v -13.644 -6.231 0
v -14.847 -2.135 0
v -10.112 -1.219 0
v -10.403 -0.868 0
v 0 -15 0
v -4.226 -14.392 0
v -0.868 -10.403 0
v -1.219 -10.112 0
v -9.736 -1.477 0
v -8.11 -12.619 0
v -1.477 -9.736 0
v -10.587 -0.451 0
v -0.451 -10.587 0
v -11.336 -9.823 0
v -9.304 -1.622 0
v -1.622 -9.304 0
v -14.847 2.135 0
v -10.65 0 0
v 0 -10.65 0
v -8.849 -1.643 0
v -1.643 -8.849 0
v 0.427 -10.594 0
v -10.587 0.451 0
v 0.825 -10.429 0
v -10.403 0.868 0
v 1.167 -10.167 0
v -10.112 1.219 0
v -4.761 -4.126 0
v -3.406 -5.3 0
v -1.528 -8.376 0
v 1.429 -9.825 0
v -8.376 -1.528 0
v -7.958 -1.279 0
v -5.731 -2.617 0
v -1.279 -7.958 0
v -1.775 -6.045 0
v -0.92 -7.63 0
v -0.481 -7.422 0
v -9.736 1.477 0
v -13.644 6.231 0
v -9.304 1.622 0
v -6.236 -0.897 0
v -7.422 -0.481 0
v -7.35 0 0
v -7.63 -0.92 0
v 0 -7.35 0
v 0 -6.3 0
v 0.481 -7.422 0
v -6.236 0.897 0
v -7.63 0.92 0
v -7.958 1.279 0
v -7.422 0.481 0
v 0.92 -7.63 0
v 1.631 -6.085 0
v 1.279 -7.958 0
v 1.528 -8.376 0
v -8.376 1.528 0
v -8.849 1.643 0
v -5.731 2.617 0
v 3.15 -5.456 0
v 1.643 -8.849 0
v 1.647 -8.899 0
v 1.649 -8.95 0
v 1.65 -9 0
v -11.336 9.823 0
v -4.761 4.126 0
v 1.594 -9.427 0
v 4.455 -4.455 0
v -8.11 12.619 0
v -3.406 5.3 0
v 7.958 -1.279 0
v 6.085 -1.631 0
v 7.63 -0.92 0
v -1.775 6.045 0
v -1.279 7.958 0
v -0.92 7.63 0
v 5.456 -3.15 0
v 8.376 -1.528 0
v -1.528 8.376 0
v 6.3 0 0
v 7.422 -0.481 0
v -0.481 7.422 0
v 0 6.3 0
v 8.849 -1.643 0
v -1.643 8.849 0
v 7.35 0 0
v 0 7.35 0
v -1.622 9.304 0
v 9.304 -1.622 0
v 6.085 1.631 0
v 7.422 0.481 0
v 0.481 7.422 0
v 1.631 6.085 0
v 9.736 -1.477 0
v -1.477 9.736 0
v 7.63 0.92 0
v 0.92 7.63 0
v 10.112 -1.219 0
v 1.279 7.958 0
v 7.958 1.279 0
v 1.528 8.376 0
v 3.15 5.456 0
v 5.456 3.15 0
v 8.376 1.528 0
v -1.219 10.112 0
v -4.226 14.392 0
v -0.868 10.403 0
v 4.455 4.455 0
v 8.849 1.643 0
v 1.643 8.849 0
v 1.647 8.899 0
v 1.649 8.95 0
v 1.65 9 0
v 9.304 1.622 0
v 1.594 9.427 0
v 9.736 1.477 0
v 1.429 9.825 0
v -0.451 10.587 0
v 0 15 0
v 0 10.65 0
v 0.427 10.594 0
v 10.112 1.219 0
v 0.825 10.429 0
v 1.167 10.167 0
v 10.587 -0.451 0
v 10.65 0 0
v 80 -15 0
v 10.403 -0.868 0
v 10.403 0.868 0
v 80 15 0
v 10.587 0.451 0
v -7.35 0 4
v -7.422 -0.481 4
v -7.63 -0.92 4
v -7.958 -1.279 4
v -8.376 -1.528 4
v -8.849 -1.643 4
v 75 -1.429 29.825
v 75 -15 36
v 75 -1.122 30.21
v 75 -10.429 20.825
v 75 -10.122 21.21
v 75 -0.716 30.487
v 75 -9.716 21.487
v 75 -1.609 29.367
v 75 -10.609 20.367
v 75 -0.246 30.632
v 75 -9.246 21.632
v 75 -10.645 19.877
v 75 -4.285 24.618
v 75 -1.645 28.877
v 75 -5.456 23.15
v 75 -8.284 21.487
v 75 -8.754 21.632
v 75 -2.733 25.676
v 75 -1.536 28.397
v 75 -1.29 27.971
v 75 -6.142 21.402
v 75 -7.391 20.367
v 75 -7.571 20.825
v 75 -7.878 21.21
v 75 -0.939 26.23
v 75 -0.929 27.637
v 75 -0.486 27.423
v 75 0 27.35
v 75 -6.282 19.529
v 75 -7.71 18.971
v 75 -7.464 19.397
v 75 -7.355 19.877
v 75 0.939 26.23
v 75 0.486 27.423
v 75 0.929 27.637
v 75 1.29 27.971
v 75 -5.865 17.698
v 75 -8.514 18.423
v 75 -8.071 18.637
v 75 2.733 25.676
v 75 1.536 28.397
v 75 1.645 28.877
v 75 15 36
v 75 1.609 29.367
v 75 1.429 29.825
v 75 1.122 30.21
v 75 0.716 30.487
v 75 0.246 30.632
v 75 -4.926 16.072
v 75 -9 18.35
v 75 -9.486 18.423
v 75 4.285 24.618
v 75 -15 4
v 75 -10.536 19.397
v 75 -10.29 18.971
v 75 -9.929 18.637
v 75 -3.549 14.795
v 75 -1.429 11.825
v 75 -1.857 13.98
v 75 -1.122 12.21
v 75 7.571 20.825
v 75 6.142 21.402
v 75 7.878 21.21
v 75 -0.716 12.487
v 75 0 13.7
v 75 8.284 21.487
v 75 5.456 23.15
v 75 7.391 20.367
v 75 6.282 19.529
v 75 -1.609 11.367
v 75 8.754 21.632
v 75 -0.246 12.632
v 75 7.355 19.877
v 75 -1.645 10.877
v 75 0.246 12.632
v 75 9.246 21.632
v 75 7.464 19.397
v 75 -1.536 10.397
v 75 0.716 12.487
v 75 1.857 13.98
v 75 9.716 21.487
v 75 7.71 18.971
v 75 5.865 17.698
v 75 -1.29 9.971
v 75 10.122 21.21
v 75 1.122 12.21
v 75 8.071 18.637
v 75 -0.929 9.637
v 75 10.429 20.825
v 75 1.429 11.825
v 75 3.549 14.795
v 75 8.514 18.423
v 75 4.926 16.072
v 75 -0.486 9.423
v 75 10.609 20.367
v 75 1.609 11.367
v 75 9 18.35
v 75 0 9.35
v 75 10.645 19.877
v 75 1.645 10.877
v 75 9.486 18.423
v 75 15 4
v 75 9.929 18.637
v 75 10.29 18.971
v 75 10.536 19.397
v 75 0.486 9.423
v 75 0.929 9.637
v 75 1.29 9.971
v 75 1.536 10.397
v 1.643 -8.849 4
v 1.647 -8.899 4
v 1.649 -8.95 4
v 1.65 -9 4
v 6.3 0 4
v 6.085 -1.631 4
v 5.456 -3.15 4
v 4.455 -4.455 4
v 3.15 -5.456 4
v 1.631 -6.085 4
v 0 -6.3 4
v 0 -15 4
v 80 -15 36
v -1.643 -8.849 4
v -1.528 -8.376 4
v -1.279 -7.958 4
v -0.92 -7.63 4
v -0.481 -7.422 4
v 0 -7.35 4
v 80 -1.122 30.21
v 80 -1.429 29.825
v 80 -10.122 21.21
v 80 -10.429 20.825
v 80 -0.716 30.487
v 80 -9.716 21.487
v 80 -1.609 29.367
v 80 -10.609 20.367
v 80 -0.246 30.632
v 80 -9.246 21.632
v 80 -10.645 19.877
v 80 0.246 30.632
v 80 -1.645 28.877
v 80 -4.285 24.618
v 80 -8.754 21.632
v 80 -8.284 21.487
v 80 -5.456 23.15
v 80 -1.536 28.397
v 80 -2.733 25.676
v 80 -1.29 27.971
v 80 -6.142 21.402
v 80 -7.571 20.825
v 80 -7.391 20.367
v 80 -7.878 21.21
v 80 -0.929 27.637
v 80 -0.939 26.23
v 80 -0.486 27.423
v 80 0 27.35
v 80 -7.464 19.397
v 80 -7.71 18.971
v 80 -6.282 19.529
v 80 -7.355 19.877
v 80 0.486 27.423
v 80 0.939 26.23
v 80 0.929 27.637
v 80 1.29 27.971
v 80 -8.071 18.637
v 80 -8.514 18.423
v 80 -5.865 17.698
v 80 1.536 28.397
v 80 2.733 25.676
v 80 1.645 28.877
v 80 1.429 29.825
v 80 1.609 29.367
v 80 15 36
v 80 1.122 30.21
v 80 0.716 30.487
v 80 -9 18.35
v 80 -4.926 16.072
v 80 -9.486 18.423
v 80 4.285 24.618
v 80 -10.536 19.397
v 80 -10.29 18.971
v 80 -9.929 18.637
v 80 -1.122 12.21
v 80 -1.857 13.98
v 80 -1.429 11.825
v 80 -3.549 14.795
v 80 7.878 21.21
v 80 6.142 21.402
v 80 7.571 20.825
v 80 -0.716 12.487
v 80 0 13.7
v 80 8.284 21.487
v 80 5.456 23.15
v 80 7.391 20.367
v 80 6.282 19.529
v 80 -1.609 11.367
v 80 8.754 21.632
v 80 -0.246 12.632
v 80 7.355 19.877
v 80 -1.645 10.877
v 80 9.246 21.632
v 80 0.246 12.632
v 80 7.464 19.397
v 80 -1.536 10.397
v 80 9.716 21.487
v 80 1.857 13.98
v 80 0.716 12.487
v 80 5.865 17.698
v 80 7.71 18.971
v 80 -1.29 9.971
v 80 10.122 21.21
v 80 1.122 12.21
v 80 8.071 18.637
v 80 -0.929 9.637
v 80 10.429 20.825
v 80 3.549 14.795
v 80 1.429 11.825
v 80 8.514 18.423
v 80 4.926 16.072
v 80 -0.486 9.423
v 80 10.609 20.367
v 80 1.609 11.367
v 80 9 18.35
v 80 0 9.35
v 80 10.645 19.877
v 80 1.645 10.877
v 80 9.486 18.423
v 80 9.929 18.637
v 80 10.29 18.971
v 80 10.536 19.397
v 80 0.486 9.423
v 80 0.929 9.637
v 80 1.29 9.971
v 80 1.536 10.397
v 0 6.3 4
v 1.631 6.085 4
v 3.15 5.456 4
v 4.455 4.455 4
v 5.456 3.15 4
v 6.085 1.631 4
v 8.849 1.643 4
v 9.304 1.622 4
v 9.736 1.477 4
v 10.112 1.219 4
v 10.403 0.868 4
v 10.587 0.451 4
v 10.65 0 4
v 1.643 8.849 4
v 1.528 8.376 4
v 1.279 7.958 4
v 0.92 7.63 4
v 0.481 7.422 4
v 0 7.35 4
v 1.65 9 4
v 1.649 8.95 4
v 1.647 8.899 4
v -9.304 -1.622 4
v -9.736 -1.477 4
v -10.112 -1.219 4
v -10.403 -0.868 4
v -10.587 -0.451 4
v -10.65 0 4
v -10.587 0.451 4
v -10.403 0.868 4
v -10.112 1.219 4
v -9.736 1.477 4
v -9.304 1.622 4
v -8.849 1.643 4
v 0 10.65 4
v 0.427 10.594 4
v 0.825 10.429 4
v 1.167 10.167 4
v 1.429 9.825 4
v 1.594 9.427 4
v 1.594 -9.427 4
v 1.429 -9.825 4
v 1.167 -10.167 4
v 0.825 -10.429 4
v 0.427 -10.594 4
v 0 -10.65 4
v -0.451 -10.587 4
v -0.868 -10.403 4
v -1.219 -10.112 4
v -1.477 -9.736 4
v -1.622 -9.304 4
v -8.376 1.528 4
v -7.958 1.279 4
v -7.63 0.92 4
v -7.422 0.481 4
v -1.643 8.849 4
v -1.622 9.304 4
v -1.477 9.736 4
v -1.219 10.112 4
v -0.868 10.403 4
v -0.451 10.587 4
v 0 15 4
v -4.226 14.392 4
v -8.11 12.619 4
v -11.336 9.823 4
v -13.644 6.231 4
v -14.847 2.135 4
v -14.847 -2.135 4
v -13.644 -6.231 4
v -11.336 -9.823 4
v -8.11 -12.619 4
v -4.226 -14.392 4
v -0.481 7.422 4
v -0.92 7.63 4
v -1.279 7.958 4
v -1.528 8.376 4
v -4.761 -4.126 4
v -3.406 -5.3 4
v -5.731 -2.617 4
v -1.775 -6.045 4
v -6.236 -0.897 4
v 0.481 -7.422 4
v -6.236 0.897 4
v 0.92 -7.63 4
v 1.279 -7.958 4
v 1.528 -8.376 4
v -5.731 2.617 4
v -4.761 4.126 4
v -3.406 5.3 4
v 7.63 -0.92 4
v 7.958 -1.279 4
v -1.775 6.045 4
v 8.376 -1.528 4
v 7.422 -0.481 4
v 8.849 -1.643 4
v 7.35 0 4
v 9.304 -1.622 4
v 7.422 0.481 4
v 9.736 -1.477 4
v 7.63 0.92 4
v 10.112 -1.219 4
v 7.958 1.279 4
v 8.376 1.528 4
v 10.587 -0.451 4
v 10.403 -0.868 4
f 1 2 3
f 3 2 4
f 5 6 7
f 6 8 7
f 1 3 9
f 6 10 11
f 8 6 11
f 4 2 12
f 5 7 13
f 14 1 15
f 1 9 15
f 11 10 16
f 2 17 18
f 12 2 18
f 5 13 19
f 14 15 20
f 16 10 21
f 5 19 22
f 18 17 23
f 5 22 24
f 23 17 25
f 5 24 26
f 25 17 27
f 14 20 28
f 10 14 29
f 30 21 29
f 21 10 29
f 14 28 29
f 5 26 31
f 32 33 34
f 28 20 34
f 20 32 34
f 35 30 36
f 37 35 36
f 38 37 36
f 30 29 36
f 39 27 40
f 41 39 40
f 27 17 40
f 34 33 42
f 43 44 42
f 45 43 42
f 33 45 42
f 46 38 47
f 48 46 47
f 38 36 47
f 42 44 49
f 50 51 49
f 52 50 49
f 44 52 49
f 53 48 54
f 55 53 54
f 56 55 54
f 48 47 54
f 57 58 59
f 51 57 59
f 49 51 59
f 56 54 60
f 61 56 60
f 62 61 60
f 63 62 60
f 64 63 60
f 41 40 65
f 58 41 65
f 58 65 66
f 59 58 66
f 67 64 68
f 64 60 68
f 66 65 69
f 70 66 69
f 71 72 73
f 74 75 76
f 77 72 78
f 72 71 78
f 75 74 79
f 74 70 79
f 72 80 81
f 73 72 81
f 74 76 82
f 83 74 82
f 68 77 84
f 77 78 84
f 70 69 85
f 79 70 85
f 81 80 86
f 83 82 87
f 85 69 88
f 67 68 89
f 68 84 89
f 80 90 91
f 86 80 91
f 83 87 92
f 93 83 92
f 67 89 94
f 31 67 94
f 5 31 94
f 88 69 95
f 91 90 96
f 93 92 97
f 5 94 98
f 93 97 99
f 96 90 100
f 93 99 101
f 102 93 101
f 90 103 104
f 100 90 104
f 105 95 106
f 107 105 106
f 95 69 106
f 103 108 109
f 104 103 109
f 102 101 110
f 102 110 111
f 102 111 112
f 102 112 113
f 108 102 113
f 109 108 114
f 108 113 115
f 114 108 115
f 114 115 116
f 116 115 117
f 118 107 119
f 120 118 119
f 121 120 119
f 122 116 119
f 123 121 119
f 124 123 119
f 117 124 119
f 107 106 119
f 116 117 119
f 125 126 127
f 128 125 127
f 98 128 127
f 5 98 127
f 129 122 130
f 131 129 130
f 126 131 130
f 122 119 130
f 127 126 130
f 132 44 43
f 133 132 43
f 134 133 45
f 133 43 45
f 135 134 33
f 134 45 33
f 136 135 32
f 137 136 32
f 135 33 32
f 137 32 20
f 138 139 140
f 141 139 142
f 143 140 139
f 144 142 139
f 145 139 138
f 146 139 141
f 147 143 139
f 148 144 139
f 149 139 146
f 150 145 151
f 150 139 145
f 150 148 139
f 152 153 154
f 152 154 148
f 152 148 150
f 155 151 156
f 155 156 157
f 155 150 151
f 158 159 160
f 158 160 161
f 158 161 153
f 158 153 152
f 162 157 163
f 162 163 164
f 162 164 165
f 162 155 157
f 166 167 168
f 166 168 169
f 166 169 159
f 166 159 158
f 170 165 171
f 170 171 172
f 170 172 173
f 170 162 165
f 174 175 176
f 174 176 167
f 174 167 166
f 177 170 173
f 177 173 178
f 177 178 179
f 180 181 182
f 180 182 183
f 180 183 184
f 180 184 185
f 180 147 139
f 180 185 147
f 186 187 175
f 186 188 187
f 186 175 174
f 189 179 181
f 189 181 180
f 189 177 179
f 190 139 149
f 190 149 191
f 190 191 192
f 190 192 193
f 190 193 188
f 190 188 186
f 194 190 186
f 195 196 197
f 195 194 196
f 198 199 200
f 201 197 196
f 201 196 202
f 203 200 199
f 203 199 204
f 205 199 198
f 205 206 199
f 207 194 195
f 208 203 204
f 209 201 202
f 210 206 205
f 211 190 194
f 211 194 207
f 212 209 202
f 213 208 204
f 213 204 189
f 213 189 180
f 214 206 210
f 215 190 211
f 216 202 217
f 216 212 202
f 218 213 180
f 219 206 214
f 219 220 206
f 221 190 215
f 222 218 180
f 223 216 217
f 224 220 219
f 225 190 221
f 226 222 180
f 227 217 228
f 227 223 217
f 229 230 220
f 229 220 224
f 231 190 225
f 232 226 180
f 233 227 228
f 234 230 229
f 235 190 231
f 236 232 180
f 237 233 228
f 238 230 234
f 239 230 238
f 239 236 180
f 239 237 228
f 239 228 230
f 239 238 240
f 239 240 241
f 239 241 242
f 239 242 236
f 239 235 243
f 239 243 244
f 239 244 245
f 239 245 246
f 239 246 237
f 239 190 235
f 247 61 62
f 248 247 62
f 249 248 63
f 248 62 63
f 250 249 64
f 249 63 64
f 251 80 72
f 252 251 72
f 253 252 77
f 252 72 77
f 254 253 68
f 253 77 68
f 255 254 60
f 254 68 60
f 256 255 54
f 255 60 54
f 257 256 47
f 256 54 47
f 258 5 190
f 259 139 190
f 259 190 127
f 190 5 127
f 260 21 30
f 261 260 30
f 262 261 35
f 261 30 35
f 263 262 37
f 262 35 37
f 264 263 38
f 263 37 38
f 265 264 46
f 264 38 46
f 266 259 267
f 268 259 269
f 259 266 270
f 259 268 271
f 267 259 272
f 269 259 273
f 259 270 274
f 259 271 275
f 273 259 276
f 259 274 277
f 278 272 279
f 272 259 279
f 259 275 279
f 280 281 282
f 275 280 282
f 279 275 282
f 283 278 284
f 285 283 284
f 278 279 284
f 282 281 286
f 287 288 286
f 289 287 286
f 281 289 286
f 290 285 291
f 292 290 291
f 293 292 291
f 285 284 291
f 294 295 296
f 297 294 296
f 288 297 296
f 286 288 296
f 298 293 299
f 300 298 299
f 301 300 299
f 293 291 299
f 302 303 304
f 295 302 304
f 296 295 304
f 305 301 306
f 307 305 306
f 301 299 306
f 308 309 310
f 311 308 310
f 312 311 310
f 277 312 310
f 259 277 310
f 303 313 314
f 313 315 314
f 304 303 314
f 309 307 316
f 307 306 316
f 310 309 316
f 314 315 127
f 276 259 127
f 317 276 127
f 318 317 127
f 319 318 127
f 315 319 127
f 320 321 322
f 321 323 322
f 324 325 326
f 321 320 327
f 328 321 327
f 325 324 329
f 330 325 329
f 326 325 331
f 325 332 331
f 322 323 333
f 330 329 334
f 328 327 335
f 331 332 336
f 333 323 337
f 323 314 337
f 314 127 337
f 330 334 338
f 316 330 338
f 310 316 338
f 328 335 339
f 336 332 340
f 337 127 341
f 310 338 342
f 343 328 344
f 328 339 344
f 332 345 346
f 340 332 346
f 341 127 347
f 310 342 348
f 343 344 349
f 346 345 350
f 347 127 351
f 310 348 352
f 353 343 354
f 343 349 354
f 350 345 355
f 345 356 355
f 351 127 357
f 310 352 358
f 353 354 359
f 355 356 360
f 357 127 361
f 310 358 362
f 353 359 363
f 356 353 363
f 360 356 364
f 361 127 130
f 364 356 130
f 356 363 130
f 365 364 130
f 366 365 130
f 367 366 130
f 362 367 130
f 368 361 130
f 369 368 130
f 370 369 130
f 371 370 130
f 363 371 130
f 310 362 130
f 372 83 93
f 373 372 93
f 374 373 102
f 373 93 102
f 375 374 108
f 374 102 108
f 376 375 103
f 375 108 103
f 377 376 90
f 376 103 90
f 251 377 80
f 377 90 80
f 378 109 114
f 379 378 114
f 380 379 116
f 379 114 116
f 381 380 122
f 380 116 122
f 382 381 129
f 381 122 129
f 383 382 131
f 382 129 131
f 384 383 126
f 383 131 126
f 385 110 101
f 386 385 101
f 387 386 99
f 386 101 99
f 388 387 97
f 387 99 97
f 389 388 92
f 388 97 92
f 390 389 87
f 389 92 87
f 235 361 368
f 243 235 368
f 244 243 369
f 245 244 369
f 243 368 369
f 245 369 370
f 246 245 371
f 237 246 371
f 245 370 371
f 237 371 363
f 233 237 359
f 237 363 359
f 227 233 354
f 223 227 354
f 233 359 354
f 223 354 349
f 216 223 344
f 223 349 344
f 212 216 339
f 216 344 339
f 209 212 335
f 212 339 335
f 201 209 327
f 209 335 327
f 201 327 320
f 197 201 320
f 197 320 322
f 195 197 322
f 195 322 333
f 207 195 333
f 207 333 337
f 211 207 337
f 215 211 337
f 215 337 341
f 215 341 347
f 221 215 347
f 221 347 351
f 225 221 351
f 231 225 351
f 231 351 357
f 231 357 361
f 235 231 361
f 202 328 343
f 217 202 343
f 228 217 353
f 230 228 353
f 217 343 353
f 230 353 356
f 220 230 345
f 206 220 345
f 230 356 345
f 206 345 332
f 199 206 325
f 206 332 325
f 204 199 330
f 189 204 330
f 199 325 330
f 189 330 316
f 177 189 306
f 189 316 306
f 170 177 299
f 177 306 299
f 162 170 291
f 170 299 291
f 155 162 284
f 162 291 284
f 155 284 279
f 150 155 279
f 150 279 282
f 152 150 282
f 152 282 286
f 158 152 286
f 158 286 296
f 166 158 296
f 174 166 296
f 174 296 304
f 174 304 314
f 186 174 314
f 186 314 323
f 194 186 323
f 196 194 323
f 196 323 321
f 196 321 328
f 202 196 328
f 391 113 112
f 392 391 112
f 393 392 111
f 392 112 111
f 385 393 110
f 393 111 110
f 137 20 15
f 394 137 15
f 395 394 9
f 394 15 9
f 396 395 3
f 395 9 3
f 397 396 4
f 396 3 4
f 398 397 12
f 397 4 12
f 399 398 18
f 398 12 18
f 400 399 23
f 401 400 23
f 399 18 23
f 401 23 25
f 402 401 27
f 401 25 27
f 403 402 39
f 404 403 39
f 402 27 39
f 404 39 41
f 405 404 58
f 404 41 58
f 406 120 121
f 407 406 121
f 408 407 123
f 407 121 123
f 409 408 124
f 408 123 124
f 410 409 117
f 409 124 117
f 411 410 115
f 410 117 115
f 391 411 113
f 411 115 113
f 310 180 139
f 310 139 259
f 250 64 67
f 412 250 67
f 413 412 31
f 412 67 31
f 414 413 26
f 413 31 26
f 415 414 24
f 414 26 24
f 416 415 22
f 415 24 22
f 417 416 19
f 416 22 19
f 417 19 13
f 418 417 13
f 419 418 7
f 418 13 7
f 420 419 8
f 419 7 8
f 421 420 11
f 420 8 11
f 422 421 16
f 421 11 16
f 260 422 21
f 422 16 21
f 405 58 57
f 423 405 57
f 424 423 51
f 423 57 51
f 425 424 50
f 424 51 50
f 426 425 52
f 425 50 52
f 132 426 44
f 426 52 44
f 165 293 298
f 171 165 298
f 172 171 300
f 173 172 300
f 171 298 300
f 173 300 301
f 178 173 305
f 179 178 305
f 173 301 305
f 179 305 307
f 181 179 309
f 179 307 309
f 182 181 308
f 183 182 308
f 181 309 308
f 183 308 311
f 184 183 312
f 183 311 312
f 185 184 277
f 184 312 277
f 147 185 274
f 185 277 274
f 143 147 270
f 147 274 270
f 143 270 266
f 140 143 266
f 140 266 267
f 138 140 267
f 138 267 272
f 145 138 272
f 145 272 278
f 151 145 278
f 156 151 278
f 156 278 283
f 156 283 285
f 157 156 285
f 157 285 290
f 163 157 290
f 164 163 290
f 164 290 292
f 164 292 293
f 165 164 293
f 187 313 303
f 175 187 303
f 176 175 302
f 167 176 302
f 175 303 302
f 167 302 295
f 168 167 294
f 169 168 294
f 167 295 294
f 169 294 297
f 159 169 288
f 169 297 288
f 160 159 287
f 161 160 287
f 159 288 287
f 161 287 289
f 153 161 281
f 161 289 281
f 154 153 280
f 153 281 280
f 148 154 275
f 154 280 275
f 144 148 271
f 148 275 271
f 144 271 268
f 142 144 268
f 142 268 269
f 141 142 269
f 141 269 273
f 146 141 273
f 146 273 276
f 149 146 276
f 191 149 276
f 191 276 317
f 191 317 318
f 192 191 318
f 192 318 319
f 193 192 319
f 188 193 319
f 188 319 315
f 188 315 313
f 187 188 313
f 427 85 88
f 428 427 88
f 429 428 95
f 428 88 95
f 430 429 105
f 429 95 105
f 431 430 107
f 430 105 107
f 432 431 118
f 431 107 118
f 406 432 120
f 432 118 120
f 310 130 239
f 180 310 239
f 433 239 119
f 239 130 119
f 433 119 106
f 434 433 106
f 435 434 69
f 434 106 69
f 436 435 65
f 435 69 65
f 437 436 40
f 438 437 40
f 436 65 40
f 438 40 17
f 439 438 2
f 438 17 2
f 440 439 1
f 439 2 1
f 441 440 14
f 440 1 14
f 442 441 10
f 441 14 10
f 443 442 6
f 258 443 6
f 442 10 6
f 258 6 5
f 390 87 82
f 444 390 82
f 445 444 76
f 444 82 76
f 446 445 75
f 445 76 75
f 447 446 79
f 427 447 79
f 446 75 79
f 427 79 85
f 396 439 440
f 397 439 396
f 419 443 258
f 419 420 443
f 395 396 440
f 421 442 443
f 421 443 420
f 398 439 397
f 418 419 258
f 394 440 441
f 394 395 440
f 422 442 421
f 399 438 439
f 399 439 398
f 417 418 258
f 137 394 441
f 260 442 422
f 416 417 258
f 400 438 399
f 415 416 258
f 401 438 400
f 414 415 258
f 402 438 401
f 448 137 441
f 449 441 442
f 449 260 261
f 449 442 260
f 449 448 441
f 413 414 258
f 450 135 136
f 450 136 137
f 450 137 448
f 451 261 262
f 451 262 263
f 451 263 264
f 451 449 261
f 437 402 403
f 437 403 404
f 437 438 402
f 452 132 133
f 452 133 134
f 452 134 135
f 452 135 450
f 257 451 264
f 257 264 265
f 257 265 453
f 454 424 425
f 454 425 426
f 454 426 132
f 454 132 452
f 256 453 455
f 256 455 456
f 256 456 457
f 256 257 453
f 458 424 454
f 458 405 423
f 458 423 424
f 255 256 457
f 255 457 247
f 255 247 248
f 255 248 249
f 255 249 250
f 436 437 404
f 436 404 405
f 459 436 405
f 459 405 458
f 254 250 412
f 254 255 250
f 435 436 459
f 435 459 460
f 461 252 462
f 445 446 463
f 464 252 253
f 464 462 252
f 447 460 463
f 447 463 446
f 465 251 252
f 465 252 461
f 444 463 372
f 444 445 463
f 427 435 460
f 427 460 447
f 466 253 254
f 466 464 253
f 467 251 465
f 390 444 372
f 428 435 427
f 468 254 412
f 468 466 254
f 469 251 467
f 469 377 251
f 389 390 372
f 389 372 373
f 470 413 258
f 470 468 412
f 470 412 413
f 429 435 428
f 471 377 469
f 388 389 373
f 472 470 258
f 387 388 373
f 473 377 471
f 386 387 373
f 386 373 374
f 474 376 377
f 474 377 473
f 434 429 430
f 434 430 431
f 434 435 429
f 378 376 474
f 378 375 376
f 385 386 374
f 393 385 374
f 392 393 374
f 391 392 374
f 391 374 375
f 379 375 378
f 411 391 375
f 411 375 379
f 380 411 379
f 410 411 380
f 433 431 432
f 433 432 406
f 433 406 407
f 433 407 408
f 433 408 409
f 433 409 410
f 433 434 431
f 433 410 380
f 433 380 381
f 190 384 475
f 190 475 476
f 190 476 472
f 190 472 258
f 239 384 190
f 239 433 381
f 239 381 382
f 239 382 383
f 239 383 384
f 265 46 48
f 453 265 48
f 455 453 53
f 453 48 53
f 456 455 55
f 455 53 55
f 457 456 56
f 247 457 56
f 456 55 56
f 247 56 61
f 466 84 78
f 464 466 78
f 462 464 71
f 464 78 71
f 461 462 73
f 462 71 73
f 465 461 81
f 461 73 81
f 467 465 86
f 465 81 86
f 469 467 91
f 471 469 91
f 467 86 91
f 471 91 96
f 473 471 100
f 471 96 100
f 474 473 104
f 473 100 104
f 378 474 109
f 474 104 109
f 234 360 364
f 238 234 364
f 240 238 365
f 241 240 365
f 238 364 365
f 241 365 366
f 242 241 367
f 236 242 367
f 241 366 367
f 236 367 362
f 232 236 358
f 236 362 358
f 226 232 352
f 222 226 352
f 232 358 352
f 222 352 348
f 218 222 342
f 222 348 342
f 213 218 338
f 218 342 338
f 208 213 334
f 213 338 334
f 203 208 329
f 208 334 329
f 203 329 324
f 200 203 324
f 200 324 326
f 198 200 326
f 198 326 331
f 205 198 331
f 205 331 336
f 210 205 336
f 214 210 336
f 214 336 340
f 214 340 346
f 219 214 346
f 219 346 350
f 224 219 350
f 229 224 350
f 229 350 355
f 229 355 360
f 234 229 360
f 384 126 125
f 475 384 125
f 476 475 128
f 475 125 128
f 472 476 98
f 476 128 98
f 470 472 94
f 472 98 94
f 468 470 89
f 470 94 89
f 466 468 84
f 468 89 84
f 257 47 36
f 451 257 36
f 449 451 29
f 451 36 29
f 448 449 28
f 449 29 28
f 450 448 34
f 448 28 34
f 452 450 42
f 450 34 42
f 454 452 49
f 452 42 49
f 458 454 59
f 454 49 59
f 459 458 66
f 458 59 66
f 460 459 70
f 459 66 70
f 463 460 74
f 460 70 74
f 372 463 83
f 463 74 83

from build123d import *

# Parameters (mm, degrees)
EXTRUDE_1_DEPTH     = 4
SKETCH_2_W          = 5
SKETCH_2_H          = 30
EXTRUDE_2_DEPTH     = 36
SKETCH_4_R          = 6.3
SKETCH_4_R_2        = 1.65
CUT_EXTRUDE_1_DEPTH = 34


with BuildPart() as part:
    # 草图1 → 凸台-拉伸1 (new body)
    with BuildSketch(Plane.XY):
        with BuildLine():
            Line((0, 10.65), (0, 15))
            ThreePointArc((0, 15), (-15, 0), (0, -15))
            Line((0, -15), (0, -10.65))
            ThreePointArc((0, -10.65), (-1.219028814, -10.111966164), (-1.643053084, -8.84875))
            ThreePointArc((-1.643053084, -8.84875), (-6.363961031, -6.363961031), (-8.84875, -1.643053084))
            ThreePointArc((-8.84875, -1.643053084), (-10.65, 0), (-8.84875, 1.643053084))
            ThreePointArc((-8.84875, 1.643053084), (-6.363961031, 6.363961031), (-1.643053084, 8.84875))
            ThreePointArc((-1.643053084, 8.84875), (-1.219028814, 10.111966164), (0, 10.65))
        make_face()
        with BuildLine():
            ThreePointArc((0, 7.35), (-1.111966164, 7.780971186), (-1.643053084, 8.84875))
            ThreePointArc((-1.643053084, 8.84875), (-6.363961031, 6.363961031), (-8.84875, 1.643053084))
            ThreePointArc((-8.84875, 1.643053084), (-7.780971186, 1.111966164), (-7.35, 0))
            ThreePointArc((-7.35, 0), (-7.780971186, -1.111966164), (-8.84875, -1.643053084))
            ThreePointArc((-8.84875, -1.643053084), (-6.363961031, -6.363961031), (-1.643053084, -8.84875))
            ThreePointArc((-1.643053084, -8.84875), (-1.111966164, -7.780971186), (0, -7.35))
            Line((0, -7.35), (0, -6.3))
            ThreePointArc((0, -6.3), (-6.3, 0), (0, 6.3))
            Line((0, 6.3), (0, 7.35))
        make_face()
        with BuildLine():
            ThreePointArc((1.643053084, 8.84875), (1.111966164, 7.780971186), (0, 7.35))
            Line((0, 7.35), (0, 6.3))
            ThreePointArc((0, 6.3), (4.454772721, 4.454772721), (6.3, 0))
            ThreePointArc((6.3, 0), (4.454772721, -4.454772721), (0, -6.3))
            Line((0, -6.3), (0, -7.35))
            ThreePointArc((0, -7.35), (1.111966164, -7.780971186), (1.643053084, -8.84875))
            ThreePointArc((1.643053084, -8.84875), (6.363961031, -6.363961031), (8.84875, -1.643053084))
            ThreePointArc((8.84875, -1.643053084), (7.35, 0), (8.84875, 1.643053084))
            ThreePointArc((8.84875, 1.643053084), (6.363961031, 6.363961031), (1.643053084, 8.84875))
        make_face()
        with BuildLine():
            ThreePointArc((15, 0), (10.606601718, 10.606601718), (0, 15))
            Line((0, 15), (0, 10.65))
            ThreePointArc((0, 10.65), (1.166726189, 10.166726189), (1.65, 9))
            ThreePointArc((1.65, 9), (1.648262356, 8.924295274), (1.643053084, 8.84875))
            ThreePointArc((1.643053084, 8.84875), (6.363961031, 6.363961031), (8.84875, 1.643053084))
            ThreePointArc((8.84875, 1.643053084), (10.111966164, 1.219028814), (10.65, 0))
            ThreePointArc((10.65, 0), (10.111966164, -1.219028814), (8.84875, -1.643053084))
            ThreePointArc((8.84875, -1.643053084), (6.363961031, -6.363961031), (1.643053084, -8.84875))
            ThreePointArc((1.643053084, -8.84875), (1.648262356, -8.924295274), (1.65, -9))
            ThreePointArc((1.65, -9), (1.166726189, -10.166726189), (0, -10.65))
            Line((0, -10.65), (0, -15))
            ThreePointArc((0, -15), (10.606601718, -10.606601718), (15, 0))
        make_face()
        with BuildLine():
            Line((80, 15), (0, 15))
            ThreePointArc((0, 15), (10.606601718, 10.606601718), (15, 0))
            ThreePointArc((15, 0), (10.606601718, -10.606601718), (0, -15))
            Line((0, -15), (80, -15))
            Line((80, -15), (80, 15))
        make_face()
    extrude(amount=EXTRUDE_1_DEPTH)

    # 草图2 → 凸台-拉伸2 (add)
    with BuildSketch(Plane.XY):
        with Locations((77.5, 0)):
            Rectangle(SKETCH_2_W, SKETCH_2_H)
    extrude(amount=EXTRUDE_2_DEPTH)

    # 草图4 → 切除-拉伸1 (cut)
    with BuildSketch(Plane(origin=(80, 0, 0), x_dir=(0, 0, -1), z_dir=(1, 0, 0))):
        with Locations((-20, 0)):
            Circle(SKETCH_4_R)
        with Locations((-29, 0)):
            Circle(SKETCH_4_R_2)
        with Locations((-20, 9)):
            Circle(SKETCH_4_R_2)
        with Locations((-11, 0)):
            Circle(SKETCH_4_R_2)
        with Locations((-20, -9)):
            Circle(SKETCH_4_R_2)
    extrude(amount=-CUT_EXTRUDE_1_DEPTH, mode=Mode.SUBTRACT)


solid = part.part
